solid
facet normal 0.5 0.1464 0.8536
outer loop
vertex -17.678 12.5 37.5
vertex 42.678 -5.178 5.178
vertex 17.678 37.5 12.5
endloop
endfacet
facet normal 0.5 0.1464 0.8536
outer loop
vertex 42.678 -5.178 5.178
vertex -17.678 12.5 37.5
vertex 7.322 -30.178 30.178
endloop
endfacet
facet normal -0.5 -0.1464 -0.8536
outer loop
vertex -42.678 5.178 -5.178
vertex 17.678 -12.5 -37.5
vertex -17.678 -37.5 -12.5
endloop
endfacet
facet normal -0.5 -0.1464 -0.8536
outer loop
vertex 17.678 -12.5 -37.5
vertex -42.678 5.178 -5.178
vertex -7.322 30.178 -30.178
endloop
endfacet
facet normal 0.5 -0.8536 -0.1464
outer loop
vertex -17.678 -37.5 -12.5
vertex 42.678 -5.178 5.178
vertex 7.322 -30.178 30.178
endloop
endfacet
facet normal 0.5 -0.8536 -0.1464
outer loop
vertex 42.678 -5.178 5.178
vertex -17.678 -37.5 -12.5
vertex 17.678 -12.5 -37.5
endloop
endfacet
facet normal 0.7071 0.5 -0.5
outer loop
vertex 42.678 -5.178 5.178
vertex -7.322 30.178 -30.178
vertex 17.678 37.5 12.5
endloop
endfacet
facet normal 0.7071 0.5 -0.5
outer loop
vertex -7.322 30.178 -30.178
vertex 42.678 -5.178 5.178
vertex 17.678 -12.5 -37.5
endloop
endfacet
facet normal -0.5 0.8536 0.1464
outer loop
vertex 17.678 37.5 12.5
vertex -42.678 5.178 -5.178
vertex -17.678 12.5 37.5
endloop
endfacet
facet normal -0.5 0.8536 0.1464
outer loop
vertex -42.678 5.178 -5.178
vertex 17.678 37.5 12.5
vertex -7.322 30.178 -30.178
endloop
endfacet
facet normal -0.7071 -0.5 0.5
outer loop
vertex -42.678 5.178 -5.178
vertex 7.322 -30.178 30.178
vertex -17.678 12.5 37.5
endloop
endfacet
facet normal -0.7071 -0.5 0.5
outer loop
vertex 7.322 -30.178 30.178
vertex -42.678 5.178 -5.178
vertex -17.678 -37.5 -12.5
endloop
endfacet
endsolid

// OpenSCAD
// Module names are of the form poly_<inkscape-path-id>().  As a result,
// you can associate a polygon in this OpenSCAD program with the corresponding
// SVG element in the Inkscape document by looking for the XML element with
// the attribute id="inkscape-path-id".

// fudge value is used to ensure that subtracted solids are a tad taller
// in the z dimension than the polygon being subtracted from.  This helps
// keep the resulting .stl file manifold.
fudge = 0.1;
height = 5;

module poly_sustainability(h)
{
  scale([25.4/90, -25.4/90, 1]) union()
  {
    linear_extrude(height=h)
      polygon([[119.059500,49.321938],[114.820081,49.739379],[110.714930,50.672563],[102.729188,53.003813],[98.759476,53.860707],[94.745789,54.151000],[90.643567,53.604105],[86.408250,51.949438],[81.966543,49.529252],[78.135691,46.642016],[74.838658,43.340990],[71.998406,39.679438],[69.537901,35.710619],[67.380105,31.487797],[63.664500,22.493188],[60.810105,13.119672],[58.605281,4.101000],[56.400691,-4.918141],[53.547000,-14.293062],[53.454500,-15.934312],[57.922292,-13.795368],[62.508553,-12.172638],[67.194408,-10.986966],[71.960984,-10.159195],[81.660799,-9.260733],[91.457000,-8.844000],[101.198592,-8.275743],[106.001723,-7.736902],[110.734578,-6.922711],[115.378283,-5.754013],[119.913963,-4.151651],[124.322743,-2.036470],[128.585750,0.670688],[132.240567,3.896293],[134.959598,7.307172],[136.863619,10.905199],[138.073406,14.692250],[138.709737,18.670199],[138.893387,22.840922],[138.385750,31.768188],[138.252571,35.795016],[138.513758,39.196957],[139.129612,42.084943],[140.060437,44.569906],[141.266536,46.762780],[142.708211,48.774496],[146.139500,52.698188],[146.139500,-138.824312],[7.299500,0.045688],[146.139500,138.911938],[146.139500,66.921938],[140.978191,60.251137],[138.133609,57.271657],[135.039344,54.642406],[131.640098,52.448097],[127.880574,50.773441],[123.705474,49.703151]]);
  }
}

module poly_make(h)
{
  scale([25.4/90, -25.4/90, 1]) union()
  {
    linear_extrude(height=h)
      polygon([[25.294875,-146.406813],[138.944875,-146.406813],[0.078625,-7.564312],[-138.790125,-146.406813],[-23.101375,-146.406813],[-22.301375,-146.104312],[-24.065906,-142.430094],[-25.161512,-141.058512],[-26.412625,-140.076813],[-35.245926,-134.869059],[-40.798094,-130.985406],[-42.653897,-129.220306],[-44.061590,-127.402457],[-45.145230,-125.403934],[-46.028875,-123.096813],[-47.214939,-118.805053],[-48.000101,-114.436529],[-48.420362,-110.023401],[-48.511727,-105.597828],[-47.851771,-96.837994],[-46.308250,-88.414313],[-44.169183,-80.584068],[-41.722586,-73.604547],[-39.256478,-67.733033],[-37.058875,-63.226813],[-34.916651,-60.055699],[-33.993017,-59.347848],[-33.160691,-59.143141],[-32.414419,-59.380084],[-31.748941,-59.997184],[-30.639344,-62.125875],[-29.789844,-65.037262],[-29.158387,-68.239391],[-28.381375,-73.548063],[-23.801375,-98.883062],[-22.646038,-99.613863],[-19.412820,-101.301734],[-14.450911,-103.189879],[-11.430819,-103.972555],[-8.109500,-104.521500],[-4.530603,-104.742115],[-0.737776,-104.539801],[3.225331,-103.819957],[7.315070,-102.487984],[11.487793,-100.449283],[15.699851,-97.609254],[19.907594,-93.873297],[24.067375,-89.146813],[20.115500,-74.382906],[15.109875,-52.249313],[14.757270,-49.960501],[14.826613,-48.149449],[15.269111,-46.808290],[16.035969,-45.929156],[17.078393,-45.504183],[18.347590,-45.525504],[19.794765,-45.985252],[21.371125,-46.875563],[25.535231,-49.975470],[30.270070,-54.079586],[35.280827,-59.093722],[40.272687,-64.923688],[44.950837,-71.475294],[49.020461,-78.654352],[52.186745,-86.366671],[53.339005,-90.393370],[54.154875,-94.518062],[54.548017,-99.656607],[54.137121,-104.580172],[52.945610,-109.331588],[50.996906,-113.953688],[48.314433,-118.489303],[44.921613,-122.981266],[40.841870,-127.472408],[36.098625,-132.005563],[29.552375,-138.249469],[26.843039,-141.229684],[24.674875,-144.636812],[25.294875,-146.406813]]);
  }
}

module poly_creatitvity(h)
{
  union() {
    scale([25.4/90, -25.4/90, 1])
    {
      linear_extrude(height=h)
        polygon([[-146.139500,-39.966937],[-146.139500,-39.009437],[-124.800750,-39.011937],[-46.575750,0.133063],[-124.795750,39.211813],[-143.664500,39.211813],[-146.138250,39.211813],[-146.138250,138.968063],[-7.297000,0.096813],[-146.138250,-138.768187],[-146.138250,-39.011937]]);
    }

    difference() {
      translate([-15.68, -0.05, 0])
      cylinder(h=h, r=2.6, $fs=0.5);

      translate([-15.68, -0.05, -h/2])
      scale([1,1,2])
      cylinder(h=h, r=1.6, $fs=0.5);

      translate([-13.68, -0.05, -h/2])
      scale([1,1,2])
      cylinder(h=h, r=1.6, $fs=0.5);
    }
    poly_border(h);
  }
}

module poly_border(h)
{
  translate([0.3, 0, 0])
  scale([25.4/90, -25.4/90, 1])
  {
    difference() {
      scale([1, 1.2, 1])
      bow(h);

      translate([ 3, 0, -h/2])
      scale([1,1.2,2])
      bow(h);
    }
  }
}

module bow(h) {
  linear_extrude(height=h)
    polygon([[-125.332625,-44.244312],[-128.603252,-33.355375],[-131.030145,-22.440934],[-132.567847,-11.483456],[-133.170906,-0.465406],[-132.793868,10.630749],[-131.391277,21.822543],[-128.917681,33.127511],[-125.327625,44.563188]]);
}

module poly_tip(h)
{
  scale([25.4/90, -25.4/90, 1]) union()
  {
    linear_extrude(height=h)
      polygon([[-46.478250,0.159938],[-46.663282,1.994305],[-47.193973,3.703238],[-48.033716,5.250013],[-49.145906,6.597906],[-50.493936,7.710194],[-52.041199,8.550152],[-53.751089,9.081058],[-55.587000,9.266188],[-57.422444,9.081058],[-59.131883,8.550152],[-60.678724,7.710194],[-62.026375,6.597906],[-63.138245,5.250013],[-63.977742,3.703238],[-64.508274,1.994305],[-64.693250,0.159938],[-64.508274,-1.676081],[-63.977742,-3.386254],[-63.138245,-4.933917],[-62.026375,-6.282406],[-60.678724,-7.395055],[-59.131883,-8.235199],[-57.422444,-8.766173],[-55.587000,-8.951313],[-53.751089,-8.766173],[-52.041199,-8.235199],[-50.493936,-7.395055],[-49.145906,-6.282406],[-48.033716,-4.933917],[-47.193973,-3.386254],[-46.663282,-1.676081],[-46.478250,0.159938]]);
  }
}

module poly_social(h)
{
  scale([25.4/90, -25.4/90, 1]) union()
  {
    linear_extrude(height=h)
      polygon([[99.931125,107.398063],[93.964875,110.195563],[84.841145,113.449215],[74.992844,115.865094],[64.533996,117.369020],[53.578625,117.886813],[47.306281,117.601188],[41.173625,117.000563],[33.830168,121.030191],[18.104406,129.165719],[10.053447,132.920057],[3.453254,135.477105],[1.066606,136.075004],[-0.514058,136.095609],[-0.955969,135.860471],[-1.140973,135.446264],[-0.666375,134.034313],[3.124208,127.112831],[5.720871,121.427457],[7.335825,116.881644],[8.181281,113.378844],[8.469453,110.822508],[8.412551,109.116090],[8.112375,107.866813],[1.538410,104.172823],[-4.247234,100.074039],[-9.217371,95.619298],[-13.344812,90.857438],[-16.602371,85.837296],[-18.962859,80.607711],[-20.399090,75.217521],[-20.883875,69.715563],[-20.722091,66.512633],[-20.243042,63.365719],[-19.456886,60.281383],[-18.373777,57.266188],[-15.357334,51.469469],[-11.274969,46.028063],[-6.207935,40.994469],[-0.237488,36.421188],[6.555117,32.360719],[14.088625,28.865563],[19.436125,26.919313],[16.698625,24.183063],[0.078625,7.564313],[-138.788875,146.406813],[138.944875,146.406813],[99.931125,107.398063]]);
  }
}
module logo()
{
  union() {
    translate([1, 0, 0])
    poly_sustainability(height);

    translate([0, 1, 0])
    poly_make(height);

    translate([-1, 0, 0])
    poly_creatitvity(height);

    translate([0, -1, 0])
    poly_social(height);

    //cylinder(h=height/2, r=5, $fs=1);
  }
}
/*
difference() {
  translate([-50, -50, 0])
  cube([100, 100, height*2]);

  translate([0, 0, height+0.1])
  logo();
}*/


rotate(45, [0,1,1])
cube([50, 50, 50], center=true);
